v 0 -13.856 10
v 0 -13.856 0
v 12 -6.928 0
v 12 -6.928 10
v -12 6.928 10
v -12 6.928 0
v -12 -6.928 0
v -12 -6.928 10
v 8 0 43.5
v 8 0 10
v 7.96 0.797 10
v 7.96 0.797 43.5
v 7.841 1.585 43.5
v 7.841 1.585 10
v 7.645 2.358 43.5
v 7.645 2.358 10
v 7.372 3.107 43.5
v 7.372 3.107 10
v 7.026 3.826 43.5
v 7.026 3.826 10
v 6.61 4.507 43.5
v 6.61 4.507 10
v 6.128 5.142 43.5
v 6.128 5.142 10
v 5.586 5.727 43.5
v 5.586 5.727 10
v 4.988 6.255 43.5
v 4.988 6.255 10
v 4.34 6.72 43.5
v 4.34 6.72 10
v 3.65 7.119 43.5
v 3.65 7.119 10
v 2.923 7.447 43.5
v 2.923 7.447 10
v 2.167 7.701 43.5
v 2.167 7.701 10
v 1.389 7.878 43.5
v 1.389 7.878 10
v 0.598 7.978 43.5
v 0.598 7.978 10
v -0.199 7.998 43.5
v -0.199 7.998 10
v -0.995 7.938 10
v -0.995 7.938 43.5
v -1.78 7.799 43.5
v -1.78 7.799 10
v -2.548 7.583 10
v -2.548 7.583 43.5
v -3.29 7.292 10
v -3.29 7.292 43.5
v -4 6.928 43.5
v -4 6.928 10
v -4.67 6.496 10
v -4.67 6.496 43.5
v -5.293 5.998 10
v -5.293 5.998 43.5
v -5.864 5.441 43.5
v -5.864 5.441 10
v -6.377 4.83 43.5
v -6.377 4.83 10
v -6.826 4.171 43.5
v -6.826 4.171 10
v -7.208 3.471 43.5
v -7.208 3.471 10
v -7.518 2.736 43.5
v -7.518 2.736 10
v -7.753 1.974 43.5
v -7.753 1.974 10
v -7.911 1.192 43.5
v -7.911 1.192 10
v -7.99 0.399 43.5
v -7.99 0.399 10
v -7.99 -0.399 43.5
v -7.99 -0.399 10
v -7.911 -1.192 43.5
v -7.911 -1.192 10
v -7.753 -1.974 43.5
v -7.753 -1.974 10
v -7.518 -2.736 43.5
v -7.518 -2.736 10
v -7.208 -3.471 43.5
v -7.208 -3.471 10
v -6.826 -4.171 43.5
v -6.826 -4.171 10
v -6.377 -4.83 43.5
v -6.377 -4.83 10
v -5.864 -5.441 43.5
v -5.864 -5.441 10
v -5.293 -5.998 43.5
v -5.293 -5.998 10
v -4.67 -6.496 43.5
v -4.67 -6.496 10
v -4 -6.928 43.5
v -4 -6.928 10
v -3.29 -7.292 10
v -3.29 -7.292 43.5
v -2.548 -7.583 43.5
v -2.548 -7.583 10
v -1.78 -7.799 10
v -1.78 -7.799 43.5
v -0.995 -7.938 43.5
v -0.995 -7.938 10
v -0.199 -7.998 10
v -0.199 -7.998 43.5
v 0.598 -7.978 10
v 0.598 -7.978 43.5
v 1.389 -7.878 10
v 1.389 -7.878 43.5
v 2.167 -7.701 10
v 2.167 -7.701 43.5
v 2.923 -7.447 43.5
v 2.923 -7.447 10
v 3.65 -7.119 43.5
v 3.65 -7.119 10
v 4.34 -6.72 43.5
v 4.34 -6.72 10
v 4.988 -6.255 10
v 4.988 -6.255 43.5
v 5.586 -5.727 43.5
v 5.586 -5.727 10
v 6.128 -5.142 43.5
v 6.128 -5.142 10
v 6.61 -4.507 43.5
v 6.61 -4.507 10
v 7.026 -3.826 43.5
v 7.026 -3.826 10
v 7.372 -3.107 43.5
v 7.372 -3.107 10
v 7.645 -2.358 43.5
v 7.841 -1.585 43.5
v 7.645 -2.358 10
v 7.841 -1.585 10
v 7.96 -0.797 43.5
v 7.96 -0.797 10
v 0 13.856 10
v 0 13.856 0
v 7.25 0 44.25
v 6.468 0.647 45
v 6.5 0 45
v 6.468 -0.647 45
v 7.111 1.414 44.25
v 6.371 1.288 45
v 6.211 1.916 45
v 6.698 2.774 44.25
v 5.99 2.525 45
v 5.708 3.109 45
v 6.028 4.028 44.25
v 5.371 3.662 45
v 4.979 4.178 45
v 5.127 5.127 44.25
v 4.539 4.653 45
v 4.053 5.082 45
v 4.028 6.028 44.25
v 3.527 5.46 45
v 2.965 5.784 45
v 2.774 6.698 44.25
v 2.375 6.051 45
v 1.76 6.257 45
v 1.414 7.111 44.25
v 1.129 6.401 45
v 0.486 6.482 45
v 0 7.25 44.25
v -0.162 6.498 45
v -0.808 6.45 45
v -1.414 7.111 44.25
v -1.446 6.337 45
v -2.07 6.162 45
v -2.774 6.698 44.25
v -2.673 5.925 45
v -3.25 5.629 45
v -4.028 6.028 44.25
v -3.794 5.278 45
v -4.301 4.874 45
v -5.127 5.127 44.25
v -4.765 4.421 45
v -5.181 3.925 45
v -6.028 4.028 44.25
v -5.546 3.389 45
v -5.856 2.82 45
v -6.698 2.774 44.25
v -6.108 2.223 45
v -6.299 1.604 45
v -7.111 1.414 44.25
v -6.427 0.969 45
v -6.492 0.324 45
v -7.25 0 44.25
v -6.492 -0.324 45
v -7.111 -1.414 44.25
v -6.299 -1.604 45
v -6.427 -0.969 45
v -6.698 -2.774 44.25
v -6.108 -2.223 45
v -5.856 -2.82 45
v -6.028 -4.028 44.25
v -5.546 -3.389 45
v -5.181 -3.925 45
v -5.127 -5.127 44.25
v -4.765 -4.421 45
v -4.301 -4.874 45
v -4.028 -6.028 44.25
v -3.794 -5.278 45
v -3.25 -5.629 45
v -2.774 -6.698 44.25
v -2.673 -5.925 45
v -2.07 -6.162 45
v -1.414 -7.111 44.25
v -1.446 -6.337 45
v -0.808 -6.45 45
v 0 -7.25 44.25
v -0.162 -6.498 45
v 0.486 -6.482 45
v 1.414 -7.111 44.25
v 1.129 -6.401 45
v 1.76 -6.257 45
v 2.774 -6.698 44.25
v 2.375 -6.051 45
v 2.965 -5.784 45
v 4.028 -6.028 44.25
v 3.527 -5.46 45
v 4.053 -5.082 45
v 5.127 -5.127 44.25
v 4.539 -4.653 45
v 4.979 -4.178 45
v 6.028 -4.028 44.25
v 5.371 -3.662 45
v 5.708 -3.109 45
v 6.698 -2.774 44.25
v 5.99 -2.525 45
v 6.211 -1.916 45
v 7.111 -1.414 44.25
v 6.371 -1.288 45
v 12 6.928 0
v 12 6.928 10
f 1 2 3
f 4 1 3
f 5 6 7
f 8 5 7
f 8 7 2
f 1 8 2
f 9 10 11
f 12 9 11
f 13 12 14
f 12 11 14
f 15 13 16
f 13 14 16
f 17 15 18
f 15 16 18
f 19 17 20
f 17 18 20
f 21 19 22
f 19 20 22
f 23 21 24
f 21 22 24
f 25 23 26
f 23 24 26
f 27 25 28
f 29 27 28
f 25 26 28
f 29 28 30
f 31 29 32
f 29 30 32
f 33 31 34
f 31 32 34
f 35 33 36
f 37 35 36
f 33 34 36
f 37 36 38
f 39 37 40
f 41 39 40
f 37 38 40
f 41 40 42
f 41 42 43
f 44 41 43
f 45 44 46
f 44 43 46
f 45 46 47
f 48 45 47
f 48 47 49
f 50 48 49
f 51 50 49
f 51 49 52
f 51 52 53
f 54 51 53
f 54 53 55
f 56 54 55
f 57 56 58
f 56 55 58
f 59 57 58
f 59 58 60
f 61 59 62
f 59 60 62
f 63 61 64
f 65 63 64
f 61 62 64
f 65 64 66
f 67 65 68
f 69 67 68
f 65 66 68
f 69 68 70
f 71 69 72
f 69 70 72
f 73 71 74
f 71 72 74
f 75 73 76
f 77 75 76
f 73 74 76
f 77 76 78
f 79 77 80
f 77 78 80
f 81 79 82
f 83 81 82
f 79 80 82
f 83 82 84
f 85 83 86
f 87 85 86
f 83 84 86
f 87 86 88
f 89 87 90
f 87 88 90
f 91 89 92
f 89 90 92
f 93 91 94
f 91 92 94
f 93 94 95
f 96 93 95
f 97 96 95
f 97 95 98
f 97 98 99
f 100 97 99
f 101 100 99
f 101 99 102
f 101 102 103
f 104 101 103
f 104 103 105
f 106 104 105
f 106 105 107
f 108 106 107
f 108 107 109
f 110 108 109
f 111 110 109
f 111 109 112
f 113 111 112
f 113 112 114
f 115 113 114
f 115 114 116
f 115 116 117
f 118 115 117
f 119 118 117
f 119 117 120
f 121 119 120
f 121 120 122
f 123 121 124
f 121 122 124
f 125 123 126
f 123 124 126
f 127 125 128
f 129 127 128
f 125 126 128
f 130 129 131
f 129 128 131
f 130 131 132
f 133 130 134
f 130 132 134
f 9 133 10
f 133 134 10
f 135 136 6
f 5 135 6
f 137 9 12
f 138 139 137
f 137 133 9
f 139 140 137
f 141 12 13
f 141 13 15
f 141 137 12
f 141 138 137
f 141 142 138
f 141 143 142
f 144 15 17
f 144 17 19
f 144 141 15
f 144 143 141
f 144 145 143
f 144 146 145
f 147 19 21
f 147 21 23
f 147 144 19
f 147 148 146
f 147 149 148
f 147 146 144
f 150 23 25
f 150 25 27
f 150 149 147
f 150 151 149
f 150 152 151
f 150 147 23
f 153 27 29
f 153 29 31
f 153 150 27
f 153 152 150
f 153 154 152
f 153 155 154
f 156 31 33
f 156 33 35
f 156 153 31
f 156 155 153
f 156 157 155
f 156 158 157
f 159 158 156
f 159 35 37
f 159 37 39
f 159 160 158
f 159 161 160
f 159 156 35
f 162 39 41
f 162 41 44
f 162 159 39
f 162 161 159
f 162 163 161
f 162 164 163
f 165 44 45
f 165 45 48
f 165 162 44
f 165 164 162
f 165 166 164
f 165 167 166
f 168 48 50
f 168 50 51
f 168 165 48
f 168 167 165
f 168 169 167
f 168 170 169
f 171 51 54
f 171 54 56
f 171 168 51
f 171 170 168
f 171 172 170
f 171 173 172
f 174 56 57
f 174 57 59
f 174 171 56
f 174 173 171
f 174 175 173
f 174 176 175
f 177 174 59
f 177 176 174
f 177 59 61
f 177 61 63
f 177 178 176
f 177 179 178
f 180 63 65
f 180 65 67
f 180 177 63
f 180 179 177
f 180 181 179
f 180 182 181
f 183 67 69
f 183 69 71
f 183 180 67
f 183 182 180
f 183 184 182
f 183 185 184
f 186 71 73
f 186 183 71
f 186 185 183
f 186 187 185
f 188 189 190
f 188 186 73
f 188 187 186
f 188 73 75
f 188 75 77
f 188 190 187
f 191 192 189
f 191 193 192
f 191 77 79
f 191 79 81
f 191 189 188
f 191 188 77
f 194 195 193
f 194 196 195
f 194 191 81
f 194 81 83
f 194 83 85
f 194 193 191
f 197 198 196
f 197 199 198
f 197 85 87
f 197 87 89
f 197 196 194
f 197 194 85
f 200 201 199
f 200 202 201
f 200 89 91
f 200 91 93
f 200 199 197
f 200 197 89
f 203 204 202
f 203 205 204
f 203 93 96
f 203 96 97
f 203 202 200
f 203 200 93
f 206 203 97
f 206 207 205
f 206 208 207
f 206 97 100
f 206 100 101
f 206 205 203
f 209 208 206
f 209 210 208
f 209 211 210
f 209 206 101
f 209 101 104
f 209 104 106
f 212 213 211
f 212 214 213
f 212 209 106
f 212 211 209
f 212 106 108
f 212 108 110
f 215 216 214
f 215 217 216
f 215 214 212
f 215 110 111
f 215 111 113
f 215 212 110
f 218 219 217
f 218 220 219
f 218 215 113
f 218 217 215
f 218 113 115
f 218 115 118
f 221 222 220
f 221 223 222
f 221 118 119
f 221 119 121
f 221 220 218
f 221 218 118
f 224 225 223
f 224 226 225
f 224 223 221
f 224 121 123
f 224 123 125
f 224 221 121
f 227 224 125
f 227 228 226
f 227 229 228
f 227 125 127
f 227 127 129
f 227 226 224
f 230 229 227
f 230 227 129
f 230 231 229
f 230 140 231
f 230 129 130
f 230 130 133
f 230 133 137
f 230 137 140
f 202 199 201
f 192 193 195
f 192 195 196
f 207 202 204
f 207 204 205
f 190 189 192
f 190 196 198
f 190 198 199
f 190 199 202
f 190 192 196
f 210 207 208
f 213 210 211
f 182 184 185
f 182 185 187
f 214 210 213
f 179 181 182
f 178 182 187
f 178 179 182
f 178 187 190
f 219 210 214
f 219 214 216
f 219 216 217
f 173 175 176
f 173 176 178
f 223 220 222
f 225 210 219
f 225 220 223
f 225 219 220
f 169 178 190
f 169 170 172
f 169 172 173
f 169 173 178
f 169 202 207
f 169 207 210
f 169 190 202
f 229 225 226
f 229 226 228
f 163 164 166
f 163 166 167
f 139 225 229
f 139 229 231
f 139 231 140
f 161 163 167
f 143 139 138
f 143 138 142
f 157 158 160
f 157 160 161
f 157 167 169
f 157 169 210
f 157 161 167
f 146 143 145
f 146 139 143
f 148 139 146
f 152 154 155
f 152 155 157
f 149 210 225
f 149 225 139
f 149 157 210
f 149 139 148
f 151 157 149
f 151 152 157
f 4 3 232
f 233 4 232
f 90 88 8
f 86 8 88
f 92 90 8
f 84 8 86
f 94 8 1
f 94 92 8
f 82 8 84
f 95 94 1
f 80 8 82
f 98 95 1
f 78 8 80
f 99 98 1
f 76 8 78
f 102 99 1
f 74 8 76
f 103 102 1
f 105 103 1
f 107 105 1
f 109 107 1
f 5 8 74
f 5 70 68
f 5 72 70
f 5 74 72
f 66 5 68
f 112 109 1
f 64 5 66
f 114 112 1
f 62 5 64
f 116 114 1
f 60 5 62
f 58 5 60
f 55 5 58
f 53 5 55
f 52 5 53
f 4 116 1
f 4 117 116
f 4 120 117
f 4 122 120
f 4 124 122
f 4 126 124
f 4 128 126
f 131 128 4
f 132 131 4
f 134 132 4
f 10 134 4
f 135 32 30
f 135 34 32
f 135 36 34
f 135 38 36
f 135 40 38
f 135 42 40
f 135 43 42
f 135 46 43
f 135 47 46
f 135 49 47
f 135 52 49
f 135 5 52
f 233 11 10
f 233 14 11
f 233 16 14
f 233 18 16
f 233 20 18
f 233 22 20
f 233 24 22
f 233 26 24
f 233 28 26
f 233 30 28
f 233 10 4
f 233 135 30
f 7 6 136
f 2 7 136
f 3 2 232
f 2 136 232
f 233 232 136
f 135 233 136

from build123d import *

# Parameters (mm, degrees)
F1_DEPTH = 10
F2_R     = 8
F3_DEPTH = 35
F4_SIZE  = 1.5


with BuildPart() as f1:
    # F0 (on Top) → F1 (new body)
    with BuildSketch(Plane.XY):
        Polygon((12, -6.928203), (12, 6.928203), (0, 13.856406), (-12, 6.928203), (-12, -6.928203), (0, -13.856406), align=None)
    extrude(amount=F1_DEPTH)

    # F2 (on face) → F3 (join)
    with BuildSketch(Plane.XY.offset(10)):
        Circle(F2_R)
    extrude(amount=F3_DEPTH)

    # F4
    f4_edges = [f1.edges().sort_by_distance(p)[0] for p in [
        (-8, 0, 45),
    ]]
    chamfer(f4_edges, length=F4_SIZE)


solid = f1.part
